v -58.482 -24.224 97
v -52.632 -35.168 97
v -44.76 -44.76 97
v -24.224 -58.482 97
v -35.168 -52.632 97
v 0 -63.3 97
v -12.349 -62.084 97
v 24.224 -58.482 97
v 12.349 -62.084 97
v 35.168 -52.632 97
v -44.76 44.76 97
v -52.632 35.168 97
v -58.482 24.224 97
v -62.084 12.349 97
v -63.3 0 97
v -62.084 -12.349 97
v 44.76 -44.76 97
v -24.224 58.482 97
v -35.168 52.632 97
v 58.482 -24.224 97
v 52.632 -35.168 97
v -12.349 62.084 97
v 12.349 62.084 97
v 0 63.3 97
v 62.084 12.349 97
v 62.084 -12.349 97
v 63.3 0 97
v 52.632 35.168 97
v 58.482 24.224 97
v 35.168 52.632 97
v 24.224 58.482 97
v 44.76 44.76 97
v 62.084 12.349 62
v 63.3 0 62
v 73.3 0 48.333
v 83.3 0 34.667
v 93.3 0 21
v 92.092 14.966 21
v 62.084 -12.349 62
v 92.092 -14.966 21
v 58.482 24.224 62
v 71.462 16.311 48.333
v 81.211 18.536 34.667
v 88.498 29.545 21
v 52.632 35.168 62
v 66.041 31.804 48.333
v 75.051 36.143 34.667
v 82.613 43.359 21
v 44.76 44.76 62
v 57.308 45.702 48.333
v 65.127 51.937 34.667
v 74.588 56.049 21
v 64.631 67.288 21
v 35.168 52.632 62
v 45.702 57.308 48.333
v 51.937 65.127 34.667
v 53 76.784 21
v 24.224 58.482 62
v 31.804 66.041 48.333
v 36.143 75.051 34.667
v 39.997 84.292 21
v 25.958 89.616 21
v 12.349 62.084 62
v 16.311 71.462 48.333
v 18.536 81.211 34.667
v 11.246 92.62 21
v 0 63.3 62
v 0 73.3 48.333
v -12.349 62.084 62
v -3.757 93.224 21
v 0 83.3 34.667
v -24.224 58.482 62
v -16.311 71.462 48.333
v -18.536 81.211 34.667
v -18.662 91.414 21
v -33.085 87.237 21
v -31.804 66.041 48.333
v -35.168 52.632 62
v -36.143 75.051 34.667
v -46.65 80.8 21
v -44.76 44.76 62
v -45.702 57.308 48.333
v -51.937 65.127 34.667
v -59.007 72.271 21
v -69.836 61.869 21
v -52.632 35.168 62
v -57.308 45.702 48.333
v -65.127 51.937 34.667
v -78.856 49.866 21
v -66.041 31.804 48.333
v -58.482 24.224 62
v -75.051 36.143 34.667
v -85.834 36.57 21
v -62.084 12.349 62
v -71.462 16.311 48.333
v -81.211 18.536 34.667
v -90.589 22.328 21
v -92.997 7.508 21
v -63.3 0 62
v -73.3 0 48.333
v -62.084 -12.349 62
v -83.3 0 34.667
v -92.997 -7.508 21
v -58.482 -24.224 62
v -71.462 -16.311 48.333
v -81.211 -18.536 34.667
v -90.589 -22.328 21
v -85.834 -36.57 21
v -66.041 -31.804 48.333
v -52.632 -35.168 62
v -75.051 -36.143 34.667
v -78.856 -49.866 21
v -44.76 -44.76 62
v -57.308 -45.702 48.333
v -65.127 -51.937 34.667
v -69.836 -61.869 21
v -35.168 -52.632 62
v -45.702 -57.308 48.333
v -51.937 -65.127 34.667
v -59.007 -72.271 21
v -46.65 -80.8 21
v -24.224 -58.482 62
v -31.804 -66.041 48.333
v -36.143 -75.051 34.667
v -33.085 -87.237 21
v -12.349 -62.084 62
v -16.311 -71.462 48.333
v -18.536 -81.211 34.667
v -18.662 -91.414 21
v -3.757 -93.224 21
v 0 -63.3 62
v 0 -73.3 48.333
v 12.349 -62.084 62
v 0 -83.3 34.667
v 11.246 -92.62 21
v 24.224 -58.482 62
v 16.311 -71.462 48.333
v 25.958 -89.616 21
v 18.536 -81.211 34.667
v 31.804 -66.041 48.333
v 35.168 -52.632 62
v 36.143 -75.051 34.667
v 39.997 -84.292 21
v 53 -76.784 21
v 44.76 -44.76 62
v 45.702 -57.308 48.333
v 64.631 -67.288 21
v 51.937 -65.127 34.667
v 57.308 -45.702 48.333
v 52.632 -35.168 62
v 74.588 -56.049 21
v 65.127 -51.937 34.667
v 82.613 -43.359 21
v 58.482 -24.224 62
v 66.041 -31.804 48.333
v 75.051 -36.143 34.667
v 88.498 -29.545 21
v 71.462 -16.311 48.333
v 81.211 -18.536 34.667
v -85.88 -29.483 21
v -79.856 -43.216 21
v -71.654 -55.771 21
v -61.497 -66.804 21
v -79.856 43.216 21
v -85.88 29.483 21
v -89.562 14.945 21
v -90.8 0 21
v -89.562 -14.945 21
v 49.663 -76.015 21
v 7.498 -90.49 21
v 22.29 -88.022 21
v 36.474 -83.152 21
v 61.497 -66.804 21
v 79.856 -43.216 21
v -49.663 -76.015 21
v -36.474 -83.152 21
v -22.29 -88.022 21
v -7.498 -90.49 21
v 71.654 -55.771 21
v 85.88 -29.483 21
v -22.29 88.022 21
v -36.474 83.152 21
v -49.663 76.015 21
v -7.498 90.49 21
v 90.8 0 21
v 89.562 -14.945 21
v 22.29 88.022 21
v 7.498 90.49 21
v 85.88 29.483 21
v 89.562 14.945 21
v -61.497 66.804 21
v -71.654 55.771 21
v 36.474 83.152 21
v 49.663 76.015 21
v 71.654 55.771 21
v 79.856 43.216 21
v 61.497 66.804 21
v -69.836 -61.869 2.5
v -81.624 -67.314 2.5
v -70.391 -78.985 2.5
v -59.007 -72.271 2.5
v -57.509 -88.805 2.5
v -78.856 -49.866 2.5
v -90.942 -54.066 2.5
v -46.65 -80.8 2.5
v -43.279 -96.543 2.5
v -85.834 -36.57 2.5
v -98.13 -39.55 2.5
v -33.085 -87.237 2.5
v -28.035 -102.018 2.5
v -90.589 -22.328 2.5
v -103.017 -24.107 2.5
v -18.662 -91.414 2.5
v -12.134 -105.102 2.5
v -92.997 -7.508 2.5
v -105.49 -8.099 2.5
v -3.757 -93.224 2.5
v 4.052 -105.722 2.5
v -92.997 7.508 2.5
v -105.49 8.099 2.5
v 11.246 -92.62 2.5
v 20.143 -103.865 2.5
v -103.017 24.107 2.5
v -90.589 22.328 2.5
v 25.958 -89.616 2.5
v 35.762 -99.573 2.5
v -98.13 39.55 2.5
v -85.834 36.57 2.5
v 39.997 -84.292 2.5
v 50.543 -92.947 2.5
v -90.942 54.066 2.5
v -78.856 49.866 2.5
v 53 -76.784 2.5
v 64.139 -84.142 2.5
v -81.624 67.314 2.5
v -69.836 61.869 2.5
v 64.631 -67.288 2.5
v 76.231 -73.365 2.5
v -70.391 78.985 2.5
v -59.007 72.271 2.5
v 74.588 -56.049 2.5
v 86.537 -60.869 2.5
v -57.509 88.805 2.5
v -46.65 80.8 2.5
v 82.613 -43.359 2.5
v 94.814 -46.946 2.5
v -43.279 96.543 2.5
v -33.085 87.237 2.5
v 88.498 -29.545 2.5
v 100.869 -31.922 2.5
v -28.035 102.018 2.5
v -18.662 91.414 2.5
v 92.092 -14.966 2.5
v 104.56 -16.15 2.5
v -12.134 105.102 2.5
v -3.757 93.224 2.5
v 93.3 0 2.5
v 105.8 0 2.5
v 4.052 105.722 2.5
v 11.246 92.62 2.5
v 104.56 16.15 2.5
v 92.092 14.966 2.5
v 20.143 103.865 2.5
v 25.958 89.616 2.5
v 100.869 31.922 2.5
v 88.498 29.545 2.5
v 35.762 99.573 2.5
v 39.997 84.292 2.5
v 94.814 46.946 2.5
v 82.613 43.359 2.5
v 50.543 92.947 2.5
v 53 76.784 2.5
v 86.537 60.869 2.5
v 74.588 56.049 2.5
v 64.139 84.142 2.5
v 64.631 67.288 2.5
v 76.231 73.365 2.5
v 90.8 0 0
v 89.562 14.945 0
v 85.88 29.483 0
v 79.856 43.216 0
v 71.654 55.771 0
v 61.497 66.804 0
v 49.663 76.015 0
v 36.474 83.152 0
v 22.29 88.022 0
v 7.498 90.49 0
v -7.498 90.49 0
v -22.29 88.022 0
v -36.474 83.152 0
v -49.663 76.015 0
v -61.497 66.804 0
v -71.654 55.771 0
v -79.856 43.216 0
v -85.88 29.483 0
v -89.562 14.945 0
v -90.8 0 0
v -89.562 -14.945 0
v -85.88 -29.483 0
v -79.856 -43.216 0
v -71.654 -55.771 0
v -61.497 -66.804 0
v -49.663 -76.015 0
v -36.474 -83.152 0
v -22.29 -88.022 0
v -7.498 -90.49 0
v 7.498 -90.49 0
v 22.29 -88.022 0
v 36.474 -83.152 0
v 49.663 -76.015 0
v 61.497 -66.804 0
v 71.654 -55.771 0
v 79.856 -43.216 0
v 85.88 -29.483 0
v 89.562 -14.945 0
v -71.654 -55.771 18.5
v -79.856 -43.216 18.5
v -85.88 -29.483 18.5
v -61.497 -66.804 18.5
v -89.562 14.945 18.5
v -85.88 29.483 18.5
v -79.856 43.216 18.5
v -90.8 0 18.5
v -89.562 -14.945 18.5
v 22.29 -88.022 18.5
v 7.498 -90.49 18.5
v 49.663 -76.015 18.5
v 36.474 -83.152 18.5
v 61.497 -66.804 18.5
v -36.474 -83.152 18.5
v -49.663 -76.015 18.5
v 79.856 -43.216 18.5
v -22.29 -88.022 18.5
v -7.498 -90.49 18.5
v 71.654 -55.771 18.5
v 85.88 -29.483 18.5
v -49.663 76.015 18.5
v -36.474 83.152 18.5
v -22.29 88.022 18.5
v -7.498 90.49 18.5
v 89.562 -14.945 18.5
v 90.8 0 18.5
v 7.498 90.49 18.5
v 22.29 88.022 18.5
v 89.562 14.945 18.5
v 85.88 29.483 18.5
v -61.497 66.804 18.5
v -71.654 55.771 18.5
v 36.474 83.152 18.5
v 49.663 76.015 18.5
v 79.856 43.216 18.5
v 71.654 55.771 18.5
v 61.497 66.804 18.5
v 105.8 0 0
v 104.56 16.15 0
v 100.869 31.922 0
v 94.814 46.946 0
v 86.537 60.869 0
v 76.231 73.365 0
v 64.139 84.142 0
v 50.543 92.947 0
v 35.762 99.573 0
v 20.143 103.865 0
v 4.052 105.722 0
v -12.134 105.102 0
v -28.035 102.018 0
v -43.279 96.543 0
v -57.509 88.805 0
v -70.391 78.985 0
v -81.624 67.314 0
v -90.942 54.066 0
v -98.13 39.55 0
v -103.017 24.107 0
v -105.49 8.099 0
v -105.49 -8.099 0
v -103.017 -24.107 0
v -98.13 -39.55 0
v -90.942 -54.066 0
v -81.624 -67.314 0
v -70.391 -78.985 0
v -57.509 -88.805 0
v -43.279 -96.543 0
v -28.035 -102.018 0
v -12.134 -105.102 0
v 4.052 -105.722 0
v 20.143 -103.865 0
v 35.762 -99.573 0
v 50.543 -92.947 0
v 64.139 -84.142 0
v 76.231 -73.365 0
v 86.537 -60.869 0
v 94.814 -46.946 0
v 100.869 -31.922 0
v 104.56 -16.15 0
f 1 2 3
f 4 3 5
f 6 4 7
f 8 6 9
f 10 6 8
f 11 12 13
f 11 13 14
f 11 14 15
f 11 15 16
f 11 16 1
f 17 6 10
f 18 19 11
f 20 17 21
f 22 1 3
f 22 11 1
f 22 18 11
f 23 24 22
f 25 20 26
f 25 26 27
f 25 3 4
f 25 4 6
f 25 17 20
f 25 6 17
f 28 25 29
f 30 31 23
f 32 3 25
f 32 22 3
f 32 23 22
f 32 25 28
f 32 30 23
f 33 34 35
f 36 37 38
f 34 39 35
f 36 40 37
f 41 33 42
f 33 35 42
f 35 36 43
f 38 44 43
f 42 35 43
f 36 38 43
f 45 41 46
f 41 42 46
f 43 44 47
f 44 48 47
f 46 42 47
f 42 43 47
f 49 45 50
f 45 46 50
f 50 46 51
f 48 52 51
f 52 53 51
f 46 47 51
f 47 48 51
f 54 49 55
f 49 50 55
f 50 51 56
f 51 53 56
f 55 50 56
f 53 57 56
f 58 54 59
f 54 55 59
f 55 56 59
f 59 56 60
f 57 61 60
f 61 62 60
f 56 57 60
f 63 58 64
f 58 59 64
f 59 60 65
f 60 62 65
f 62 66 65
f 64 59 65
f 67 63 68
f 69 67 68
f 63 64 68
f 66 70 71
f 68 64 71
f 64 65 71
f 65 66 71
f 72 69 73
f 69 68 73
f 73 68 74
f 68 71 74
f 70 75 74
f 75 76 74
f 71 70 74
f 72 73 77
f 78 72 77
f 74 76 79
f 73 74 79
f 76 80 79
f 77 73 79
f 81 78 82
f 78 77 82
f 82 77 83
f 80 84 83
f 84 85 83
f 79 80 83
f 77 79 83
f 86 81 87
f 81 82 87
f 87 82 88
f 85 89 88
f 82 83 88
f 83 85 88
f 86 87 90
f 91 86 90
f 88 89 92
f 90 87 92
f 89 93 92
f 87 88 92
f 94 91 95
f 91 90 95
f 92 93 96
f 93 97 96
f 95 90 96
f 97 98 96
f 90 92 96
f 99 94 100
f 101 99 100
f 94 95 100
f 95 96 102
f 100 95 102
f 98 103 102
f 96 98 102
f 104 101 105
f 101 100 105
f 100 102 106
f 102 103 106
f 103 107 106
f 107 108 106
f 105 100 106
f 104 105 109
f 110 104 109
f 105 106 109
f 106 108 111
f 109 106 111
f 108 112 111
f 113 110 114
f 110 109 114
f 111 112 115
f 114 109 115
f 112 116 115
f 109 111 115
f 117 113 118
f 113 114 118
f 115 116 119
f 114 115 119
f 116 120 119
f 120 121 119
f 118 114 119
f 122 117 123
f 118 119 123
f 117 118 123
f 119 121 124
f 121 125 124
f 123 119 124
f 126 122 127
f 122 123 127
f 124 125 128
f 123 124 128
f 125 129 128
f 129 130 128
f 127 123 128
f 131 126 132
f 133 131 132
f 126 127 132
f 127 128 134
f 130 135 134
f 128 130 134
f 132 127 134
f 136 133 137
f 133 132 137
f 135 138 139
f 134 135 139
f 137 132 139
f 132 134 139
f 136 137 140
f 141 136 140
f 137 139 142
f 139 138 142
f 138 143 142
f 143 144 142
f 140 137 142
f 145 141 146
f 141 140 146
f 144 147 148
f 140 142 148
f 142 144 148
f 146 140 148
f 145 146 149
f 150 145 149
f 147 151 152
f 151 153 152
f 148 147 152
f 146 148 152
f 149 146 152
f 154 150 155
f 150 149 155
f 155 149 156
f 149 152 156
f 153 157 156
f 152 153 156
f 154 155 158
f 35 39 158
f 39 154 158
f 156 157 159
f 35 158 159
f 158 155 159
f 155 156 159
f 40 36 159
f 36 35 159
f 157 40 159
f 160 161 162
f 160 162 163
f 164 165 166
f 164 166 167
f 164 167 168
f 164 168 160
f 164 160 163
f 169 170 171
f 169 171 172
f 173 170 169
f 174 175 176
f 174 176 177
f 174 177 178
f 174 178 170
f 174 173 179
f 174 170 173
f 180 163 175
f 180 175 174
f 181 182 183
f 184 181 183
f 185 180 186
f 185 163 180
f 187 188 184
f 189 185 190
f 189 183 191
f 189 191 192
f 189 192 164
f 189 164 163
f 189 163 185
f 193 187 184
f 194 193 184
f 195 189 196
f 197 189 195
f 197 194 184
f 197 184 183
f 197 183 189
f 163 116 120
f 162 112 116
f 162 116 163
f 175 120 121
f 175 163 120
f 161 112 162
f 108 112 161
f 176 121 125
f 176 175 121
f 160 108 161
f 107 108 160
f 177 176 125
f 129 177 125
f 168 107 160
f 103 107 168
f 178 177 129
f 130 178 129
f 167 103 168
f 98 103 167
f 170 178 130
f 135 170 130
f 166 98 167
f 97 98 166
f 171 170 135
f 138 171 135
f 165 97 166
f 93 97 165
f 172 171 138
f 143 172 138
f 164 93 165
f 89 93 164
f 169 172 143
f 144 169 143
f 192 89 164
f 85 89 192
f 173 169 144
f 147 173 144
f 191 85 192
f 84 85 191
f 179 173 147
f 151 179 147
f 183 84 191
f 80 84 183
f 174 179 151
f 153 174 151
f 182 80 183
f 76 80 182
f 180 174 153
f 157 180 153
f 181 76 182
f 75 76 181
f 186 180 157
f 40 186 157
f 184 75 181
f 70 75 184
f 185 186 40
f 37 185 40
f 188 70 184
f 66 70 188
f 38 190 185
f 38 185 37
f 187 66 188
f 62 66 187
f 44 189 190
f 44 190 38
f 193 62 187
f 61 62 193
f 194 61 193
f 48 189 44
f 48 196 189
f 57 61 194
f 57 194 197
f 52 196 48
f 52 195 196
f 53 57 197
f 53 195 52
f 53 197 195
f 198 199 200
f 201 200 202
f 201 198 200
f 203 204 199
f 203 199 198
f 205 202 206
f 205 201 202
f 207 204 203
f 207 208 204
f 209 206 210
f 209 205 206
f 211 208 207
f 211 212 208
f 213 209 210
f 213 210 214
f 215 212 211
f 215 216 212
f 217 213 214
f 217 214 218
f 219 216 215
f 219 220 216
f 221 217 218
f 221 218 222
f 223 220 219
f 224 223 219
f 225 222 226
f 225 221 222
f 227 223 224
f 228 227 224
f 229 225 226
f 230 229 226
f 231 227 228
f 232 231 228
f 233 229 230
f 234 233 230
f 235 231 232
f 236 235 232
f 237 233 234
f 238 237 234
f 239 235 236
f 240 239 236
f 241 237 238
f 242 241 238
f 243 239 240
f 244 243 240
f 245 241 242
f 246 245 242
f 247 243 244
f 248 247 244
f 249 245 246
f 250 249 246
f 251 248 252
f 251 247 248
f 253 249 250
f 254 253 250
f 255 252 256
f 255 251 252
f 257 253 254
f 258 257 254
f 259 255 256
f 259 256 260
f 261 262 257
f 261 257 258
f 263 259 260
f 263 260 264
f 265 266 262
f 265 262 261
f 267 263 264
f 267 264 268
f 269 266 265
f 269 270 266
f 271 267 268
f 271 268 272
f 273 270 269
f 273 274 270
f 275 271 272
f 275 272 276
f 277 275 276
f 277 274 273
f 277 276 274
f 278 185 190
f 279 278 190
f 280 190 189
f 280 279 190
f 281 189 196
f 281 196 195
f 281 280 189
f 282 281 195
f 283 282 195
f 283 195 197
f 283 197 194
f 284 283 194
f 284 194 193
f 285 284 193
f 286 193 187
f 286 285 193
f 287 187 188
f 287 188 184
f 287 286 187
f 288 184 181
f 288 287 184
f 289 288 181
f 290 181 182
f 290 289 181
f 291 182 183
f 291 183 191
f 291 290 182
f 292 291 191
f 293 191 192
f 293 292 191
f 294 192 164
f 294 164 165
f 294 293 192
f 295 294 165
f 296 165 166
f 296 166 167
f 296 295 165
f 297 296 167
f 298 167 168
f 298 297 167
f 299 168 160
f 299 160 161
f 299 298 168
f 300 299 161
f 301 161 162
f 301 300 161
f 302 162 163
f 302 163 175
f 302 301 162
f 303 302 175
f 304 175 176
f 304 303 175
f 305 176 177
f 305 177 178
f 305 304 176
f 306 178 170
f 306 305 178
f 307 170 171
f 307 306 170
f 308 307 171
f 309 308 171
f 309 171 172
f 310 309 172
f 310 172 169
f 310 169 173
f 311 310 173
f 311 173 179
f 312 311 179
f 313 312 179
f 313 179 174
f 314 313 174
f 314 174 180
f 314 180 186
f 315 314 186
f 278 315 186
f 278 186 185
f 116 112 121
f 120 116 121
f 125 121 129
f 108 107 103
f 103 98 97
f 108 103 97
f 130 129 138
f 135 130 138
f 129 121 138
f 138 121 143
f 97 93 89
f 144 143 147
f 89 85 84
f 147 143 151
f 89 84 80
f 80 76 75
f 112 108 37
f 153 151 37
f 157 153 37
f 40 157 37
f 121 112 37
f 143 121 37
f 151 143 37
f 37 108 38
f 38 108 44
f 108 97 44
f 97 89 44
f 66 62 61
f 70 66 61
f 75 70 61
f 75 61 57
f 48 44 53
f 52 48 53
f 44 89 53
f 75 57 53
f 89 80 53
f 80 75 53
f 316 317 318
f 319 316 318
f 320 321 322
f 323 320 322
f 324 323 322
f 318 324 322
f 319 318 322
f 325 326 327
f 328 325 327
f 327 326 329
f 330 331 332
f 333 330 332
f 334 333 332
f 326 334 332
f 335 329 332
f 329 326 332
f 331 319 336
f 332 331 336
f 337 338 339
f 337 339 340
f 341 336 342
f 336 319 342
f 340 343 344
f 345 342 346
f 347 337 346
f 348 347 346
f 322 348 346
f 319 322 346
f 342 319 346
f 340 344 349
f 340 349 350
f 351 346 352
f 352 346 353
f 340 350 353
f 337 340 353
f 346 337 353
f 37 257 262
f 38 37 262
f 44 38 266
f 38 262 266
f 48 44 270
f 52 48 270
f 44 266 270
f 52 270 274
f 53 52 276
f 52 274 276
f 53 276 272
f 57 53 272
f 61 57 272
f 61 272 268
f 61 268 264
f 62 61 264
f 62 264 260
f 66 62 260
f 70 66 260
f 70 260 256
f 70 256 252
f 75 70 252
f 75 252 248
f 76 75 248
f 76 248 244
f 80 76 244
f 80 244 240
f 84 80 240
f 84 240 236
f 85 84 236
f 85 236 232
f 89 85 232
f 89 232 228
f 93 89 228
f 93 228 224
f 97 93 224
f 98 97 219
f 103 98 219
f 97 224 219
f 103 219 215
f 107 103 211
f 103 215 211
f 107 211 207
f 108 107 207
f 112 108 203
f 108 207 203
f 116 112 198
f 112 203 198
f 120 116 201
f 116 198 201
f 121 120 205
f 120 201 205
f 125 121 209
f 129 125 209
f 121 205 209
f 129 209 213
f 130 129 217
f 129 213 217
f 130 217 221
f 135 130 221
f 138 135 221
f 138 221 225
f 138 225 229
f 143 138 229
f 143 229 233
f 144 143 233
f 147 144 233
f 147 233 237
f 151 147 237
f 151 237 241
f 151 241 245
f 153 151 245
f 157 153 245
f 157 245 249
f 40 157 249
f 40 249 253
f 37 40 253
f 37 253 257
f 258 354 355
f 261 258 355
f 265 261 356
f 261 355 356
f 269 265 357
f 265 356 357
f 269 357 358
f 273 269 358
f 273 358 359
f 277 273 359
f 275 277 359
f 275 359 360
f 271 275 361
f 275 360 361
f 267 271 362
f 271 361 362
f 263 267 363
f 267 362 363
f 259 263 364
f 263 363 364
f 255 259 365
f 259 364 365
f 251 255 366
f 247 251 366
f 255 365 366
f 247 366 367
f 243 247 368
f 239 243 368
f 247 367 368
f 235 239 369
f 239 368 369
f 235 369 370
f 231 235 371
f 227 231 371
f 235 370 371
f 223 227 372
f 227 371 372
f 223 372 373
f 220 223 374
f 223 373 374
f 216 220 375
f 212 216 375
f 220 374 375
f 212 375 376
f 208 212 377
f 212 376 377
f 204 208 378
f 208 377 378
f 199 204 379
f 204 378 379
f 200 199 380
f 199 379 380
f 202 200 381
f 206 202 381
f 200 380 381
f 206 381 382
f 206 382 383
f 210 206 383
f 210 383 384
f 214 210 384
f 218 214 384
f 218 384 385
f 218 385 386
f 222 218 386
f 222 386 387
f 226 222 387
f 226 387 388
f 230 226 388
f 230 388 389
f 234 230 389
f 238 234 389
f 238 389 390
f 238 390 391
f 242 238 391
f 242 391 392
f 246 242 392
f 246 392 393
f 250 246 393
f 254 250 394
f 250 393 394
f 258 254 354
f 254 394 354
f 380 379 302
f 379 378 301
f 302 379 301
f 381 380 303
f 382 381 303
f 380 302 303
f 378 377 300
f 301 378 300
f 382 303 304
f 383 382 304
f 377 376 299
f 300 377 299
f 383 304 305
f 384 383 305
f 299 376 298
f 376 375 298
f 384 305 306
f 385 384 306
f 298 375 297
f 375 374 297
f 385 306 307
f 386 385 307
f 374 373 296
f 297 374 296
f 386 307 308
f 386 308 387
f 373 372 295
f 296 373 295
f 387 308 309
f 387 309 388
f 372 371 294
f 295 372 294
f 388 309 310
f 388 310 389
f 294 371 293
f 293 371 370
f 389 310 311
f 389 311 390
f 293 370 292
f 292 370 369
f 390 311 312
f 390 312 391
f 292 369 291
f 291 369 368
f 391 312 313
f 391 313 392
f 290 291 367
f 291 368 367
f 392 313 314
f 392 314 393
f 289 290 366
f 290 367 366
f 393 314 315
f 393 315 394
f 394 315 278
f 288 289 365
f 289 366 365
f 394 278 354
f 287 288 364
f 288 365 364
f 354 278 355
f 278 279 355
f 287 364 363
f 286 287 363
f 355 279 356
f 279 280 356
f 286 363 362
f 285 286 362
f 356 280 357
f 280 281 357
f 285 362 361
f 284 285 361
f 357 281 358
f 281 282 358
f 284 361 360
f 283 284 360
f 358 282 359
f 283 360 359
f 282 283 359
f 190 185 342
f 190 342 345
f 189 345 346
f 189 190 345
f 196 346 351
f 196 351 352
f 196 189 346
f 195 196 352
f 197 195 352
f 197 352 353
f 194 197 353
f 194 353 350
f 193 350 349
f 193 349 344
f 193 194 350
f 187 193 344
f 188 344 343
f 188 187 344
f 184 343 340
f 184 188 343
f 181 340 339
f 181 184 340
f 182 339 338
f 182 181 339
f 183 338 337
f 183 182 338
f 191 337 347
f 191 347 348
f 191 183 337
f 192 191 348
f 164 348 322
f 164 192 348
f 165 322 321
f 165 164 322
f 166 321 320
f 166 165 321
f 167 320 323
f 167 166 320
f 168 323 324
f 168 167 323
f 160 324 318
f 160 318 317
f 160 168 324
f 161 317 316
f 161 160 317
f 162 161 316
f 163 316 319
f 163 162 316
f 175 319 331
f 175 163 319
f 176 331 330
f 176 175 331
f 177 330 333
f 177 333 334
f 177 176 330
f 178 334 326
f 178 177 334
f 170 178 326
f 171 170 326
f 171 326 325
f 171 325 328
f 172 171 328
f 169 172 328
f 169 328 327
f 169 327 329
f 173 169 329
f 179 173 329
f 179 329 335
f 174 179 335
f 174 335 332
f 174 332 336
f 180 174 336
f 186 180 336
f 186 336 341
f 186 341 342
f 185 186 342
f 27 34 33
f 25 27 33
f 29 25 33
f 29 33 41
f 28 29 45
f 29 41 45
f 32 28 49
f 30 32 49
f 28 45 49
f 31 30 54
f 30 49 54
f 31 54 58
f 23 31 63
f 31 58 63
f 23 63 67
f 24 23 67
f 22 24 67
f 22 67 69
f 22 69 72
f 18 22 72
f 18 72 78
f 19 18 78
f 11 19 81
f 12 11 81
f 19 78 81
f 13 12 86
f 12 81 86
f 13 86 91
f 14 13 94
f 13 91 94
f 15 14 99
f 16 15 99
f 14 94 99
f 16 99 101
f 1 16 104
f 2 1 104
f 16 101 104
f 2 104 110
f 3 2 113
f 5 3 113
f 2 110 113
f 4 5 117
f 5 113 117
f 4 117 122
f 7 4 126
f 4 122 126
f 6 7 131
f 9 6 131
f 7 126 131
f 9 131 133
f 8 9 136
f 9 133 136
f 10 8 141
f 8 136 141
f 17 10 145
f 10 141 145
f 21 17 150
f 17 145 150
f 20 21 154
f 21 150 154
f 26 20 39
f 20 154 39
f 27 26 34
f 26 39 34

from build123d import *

# Parameters (mm, degrees)
F0_R     = 93.3
F0_R_2   = 90.8
F1_DEPTH = 21
F0_R_3   = 105.8
F2_DEPTH = 2.5
F3_R     = 90.8
F4_DEPTH = 2.5
F3_R_2   = 93.3
F5_DEPTH = 41
F6_SIZE2 = 40.99999
F6_SIZE  = 29.99999
F7_DEPTH = 35


# Not quite as in the source:
# - a fillet or chamfer is up to 0.001 mm smaller than in the source, because OpenCascade refuses the exact size


with BuildPart() as f1:
    # F0 (on Top) → F1 (new body)
    with BuildSketch(Plane.XY):
        Circle(F0_R)
        Circle(F0_R_2, mode=Mode.SUBTRACT)
    extrude(amount=F1_DEPTH)

    # F0 (on Top) → F2 (join)
    with BuildSketch(Plane.XY):
        Circle(F0_R_3)
        Circle(F0_R, mode=Mode.SUBTRACT)
    extrude(amount=F2_DEPTH)


with BuildPart() as f4:
    # F3 (on face) → F4 (new body)
    with BuildSketch(Plane.XY.offset(21)):
        Circle(F3_R)
    extrude(amount=-F4_DEPTH)


with BuildPart() as f5:
    # F3 (on face) → F5 (new body)
    with BuildSketch(Plane.XY.offset(21)):
        Circle(F3_R_2)
        Circle(F3_R, mode=Mode.SUBTRACT)
        Circle(F3_R)
    extrude(amount=F5_DEPTH)

    # F6 (size 30 and 41 in the source; OpenCascade refuses exactly that, so slightly less here)
    f6_edges = [f5.edges().sort_by_distance(p)[0] for p in [
        (-93.3, 0, 62),
    ]]
    f6_side = f5.faces().sort_by_distance((0, 0, 62))[0]
    chamfer(f6_edges, length=F6_SIZE, length2=F6_SIZE2, reference=f6_side)

    # F7 (add): a face of the model
    f7_faces = [f5.faces().sort_by_distance(p)[0] for p in [
        (0, 0, 62),
    ]]
    extrude(f7_faces, amount=F7_DEPTH)


solid = Compound([f1.part, f4.part, f5.part])
